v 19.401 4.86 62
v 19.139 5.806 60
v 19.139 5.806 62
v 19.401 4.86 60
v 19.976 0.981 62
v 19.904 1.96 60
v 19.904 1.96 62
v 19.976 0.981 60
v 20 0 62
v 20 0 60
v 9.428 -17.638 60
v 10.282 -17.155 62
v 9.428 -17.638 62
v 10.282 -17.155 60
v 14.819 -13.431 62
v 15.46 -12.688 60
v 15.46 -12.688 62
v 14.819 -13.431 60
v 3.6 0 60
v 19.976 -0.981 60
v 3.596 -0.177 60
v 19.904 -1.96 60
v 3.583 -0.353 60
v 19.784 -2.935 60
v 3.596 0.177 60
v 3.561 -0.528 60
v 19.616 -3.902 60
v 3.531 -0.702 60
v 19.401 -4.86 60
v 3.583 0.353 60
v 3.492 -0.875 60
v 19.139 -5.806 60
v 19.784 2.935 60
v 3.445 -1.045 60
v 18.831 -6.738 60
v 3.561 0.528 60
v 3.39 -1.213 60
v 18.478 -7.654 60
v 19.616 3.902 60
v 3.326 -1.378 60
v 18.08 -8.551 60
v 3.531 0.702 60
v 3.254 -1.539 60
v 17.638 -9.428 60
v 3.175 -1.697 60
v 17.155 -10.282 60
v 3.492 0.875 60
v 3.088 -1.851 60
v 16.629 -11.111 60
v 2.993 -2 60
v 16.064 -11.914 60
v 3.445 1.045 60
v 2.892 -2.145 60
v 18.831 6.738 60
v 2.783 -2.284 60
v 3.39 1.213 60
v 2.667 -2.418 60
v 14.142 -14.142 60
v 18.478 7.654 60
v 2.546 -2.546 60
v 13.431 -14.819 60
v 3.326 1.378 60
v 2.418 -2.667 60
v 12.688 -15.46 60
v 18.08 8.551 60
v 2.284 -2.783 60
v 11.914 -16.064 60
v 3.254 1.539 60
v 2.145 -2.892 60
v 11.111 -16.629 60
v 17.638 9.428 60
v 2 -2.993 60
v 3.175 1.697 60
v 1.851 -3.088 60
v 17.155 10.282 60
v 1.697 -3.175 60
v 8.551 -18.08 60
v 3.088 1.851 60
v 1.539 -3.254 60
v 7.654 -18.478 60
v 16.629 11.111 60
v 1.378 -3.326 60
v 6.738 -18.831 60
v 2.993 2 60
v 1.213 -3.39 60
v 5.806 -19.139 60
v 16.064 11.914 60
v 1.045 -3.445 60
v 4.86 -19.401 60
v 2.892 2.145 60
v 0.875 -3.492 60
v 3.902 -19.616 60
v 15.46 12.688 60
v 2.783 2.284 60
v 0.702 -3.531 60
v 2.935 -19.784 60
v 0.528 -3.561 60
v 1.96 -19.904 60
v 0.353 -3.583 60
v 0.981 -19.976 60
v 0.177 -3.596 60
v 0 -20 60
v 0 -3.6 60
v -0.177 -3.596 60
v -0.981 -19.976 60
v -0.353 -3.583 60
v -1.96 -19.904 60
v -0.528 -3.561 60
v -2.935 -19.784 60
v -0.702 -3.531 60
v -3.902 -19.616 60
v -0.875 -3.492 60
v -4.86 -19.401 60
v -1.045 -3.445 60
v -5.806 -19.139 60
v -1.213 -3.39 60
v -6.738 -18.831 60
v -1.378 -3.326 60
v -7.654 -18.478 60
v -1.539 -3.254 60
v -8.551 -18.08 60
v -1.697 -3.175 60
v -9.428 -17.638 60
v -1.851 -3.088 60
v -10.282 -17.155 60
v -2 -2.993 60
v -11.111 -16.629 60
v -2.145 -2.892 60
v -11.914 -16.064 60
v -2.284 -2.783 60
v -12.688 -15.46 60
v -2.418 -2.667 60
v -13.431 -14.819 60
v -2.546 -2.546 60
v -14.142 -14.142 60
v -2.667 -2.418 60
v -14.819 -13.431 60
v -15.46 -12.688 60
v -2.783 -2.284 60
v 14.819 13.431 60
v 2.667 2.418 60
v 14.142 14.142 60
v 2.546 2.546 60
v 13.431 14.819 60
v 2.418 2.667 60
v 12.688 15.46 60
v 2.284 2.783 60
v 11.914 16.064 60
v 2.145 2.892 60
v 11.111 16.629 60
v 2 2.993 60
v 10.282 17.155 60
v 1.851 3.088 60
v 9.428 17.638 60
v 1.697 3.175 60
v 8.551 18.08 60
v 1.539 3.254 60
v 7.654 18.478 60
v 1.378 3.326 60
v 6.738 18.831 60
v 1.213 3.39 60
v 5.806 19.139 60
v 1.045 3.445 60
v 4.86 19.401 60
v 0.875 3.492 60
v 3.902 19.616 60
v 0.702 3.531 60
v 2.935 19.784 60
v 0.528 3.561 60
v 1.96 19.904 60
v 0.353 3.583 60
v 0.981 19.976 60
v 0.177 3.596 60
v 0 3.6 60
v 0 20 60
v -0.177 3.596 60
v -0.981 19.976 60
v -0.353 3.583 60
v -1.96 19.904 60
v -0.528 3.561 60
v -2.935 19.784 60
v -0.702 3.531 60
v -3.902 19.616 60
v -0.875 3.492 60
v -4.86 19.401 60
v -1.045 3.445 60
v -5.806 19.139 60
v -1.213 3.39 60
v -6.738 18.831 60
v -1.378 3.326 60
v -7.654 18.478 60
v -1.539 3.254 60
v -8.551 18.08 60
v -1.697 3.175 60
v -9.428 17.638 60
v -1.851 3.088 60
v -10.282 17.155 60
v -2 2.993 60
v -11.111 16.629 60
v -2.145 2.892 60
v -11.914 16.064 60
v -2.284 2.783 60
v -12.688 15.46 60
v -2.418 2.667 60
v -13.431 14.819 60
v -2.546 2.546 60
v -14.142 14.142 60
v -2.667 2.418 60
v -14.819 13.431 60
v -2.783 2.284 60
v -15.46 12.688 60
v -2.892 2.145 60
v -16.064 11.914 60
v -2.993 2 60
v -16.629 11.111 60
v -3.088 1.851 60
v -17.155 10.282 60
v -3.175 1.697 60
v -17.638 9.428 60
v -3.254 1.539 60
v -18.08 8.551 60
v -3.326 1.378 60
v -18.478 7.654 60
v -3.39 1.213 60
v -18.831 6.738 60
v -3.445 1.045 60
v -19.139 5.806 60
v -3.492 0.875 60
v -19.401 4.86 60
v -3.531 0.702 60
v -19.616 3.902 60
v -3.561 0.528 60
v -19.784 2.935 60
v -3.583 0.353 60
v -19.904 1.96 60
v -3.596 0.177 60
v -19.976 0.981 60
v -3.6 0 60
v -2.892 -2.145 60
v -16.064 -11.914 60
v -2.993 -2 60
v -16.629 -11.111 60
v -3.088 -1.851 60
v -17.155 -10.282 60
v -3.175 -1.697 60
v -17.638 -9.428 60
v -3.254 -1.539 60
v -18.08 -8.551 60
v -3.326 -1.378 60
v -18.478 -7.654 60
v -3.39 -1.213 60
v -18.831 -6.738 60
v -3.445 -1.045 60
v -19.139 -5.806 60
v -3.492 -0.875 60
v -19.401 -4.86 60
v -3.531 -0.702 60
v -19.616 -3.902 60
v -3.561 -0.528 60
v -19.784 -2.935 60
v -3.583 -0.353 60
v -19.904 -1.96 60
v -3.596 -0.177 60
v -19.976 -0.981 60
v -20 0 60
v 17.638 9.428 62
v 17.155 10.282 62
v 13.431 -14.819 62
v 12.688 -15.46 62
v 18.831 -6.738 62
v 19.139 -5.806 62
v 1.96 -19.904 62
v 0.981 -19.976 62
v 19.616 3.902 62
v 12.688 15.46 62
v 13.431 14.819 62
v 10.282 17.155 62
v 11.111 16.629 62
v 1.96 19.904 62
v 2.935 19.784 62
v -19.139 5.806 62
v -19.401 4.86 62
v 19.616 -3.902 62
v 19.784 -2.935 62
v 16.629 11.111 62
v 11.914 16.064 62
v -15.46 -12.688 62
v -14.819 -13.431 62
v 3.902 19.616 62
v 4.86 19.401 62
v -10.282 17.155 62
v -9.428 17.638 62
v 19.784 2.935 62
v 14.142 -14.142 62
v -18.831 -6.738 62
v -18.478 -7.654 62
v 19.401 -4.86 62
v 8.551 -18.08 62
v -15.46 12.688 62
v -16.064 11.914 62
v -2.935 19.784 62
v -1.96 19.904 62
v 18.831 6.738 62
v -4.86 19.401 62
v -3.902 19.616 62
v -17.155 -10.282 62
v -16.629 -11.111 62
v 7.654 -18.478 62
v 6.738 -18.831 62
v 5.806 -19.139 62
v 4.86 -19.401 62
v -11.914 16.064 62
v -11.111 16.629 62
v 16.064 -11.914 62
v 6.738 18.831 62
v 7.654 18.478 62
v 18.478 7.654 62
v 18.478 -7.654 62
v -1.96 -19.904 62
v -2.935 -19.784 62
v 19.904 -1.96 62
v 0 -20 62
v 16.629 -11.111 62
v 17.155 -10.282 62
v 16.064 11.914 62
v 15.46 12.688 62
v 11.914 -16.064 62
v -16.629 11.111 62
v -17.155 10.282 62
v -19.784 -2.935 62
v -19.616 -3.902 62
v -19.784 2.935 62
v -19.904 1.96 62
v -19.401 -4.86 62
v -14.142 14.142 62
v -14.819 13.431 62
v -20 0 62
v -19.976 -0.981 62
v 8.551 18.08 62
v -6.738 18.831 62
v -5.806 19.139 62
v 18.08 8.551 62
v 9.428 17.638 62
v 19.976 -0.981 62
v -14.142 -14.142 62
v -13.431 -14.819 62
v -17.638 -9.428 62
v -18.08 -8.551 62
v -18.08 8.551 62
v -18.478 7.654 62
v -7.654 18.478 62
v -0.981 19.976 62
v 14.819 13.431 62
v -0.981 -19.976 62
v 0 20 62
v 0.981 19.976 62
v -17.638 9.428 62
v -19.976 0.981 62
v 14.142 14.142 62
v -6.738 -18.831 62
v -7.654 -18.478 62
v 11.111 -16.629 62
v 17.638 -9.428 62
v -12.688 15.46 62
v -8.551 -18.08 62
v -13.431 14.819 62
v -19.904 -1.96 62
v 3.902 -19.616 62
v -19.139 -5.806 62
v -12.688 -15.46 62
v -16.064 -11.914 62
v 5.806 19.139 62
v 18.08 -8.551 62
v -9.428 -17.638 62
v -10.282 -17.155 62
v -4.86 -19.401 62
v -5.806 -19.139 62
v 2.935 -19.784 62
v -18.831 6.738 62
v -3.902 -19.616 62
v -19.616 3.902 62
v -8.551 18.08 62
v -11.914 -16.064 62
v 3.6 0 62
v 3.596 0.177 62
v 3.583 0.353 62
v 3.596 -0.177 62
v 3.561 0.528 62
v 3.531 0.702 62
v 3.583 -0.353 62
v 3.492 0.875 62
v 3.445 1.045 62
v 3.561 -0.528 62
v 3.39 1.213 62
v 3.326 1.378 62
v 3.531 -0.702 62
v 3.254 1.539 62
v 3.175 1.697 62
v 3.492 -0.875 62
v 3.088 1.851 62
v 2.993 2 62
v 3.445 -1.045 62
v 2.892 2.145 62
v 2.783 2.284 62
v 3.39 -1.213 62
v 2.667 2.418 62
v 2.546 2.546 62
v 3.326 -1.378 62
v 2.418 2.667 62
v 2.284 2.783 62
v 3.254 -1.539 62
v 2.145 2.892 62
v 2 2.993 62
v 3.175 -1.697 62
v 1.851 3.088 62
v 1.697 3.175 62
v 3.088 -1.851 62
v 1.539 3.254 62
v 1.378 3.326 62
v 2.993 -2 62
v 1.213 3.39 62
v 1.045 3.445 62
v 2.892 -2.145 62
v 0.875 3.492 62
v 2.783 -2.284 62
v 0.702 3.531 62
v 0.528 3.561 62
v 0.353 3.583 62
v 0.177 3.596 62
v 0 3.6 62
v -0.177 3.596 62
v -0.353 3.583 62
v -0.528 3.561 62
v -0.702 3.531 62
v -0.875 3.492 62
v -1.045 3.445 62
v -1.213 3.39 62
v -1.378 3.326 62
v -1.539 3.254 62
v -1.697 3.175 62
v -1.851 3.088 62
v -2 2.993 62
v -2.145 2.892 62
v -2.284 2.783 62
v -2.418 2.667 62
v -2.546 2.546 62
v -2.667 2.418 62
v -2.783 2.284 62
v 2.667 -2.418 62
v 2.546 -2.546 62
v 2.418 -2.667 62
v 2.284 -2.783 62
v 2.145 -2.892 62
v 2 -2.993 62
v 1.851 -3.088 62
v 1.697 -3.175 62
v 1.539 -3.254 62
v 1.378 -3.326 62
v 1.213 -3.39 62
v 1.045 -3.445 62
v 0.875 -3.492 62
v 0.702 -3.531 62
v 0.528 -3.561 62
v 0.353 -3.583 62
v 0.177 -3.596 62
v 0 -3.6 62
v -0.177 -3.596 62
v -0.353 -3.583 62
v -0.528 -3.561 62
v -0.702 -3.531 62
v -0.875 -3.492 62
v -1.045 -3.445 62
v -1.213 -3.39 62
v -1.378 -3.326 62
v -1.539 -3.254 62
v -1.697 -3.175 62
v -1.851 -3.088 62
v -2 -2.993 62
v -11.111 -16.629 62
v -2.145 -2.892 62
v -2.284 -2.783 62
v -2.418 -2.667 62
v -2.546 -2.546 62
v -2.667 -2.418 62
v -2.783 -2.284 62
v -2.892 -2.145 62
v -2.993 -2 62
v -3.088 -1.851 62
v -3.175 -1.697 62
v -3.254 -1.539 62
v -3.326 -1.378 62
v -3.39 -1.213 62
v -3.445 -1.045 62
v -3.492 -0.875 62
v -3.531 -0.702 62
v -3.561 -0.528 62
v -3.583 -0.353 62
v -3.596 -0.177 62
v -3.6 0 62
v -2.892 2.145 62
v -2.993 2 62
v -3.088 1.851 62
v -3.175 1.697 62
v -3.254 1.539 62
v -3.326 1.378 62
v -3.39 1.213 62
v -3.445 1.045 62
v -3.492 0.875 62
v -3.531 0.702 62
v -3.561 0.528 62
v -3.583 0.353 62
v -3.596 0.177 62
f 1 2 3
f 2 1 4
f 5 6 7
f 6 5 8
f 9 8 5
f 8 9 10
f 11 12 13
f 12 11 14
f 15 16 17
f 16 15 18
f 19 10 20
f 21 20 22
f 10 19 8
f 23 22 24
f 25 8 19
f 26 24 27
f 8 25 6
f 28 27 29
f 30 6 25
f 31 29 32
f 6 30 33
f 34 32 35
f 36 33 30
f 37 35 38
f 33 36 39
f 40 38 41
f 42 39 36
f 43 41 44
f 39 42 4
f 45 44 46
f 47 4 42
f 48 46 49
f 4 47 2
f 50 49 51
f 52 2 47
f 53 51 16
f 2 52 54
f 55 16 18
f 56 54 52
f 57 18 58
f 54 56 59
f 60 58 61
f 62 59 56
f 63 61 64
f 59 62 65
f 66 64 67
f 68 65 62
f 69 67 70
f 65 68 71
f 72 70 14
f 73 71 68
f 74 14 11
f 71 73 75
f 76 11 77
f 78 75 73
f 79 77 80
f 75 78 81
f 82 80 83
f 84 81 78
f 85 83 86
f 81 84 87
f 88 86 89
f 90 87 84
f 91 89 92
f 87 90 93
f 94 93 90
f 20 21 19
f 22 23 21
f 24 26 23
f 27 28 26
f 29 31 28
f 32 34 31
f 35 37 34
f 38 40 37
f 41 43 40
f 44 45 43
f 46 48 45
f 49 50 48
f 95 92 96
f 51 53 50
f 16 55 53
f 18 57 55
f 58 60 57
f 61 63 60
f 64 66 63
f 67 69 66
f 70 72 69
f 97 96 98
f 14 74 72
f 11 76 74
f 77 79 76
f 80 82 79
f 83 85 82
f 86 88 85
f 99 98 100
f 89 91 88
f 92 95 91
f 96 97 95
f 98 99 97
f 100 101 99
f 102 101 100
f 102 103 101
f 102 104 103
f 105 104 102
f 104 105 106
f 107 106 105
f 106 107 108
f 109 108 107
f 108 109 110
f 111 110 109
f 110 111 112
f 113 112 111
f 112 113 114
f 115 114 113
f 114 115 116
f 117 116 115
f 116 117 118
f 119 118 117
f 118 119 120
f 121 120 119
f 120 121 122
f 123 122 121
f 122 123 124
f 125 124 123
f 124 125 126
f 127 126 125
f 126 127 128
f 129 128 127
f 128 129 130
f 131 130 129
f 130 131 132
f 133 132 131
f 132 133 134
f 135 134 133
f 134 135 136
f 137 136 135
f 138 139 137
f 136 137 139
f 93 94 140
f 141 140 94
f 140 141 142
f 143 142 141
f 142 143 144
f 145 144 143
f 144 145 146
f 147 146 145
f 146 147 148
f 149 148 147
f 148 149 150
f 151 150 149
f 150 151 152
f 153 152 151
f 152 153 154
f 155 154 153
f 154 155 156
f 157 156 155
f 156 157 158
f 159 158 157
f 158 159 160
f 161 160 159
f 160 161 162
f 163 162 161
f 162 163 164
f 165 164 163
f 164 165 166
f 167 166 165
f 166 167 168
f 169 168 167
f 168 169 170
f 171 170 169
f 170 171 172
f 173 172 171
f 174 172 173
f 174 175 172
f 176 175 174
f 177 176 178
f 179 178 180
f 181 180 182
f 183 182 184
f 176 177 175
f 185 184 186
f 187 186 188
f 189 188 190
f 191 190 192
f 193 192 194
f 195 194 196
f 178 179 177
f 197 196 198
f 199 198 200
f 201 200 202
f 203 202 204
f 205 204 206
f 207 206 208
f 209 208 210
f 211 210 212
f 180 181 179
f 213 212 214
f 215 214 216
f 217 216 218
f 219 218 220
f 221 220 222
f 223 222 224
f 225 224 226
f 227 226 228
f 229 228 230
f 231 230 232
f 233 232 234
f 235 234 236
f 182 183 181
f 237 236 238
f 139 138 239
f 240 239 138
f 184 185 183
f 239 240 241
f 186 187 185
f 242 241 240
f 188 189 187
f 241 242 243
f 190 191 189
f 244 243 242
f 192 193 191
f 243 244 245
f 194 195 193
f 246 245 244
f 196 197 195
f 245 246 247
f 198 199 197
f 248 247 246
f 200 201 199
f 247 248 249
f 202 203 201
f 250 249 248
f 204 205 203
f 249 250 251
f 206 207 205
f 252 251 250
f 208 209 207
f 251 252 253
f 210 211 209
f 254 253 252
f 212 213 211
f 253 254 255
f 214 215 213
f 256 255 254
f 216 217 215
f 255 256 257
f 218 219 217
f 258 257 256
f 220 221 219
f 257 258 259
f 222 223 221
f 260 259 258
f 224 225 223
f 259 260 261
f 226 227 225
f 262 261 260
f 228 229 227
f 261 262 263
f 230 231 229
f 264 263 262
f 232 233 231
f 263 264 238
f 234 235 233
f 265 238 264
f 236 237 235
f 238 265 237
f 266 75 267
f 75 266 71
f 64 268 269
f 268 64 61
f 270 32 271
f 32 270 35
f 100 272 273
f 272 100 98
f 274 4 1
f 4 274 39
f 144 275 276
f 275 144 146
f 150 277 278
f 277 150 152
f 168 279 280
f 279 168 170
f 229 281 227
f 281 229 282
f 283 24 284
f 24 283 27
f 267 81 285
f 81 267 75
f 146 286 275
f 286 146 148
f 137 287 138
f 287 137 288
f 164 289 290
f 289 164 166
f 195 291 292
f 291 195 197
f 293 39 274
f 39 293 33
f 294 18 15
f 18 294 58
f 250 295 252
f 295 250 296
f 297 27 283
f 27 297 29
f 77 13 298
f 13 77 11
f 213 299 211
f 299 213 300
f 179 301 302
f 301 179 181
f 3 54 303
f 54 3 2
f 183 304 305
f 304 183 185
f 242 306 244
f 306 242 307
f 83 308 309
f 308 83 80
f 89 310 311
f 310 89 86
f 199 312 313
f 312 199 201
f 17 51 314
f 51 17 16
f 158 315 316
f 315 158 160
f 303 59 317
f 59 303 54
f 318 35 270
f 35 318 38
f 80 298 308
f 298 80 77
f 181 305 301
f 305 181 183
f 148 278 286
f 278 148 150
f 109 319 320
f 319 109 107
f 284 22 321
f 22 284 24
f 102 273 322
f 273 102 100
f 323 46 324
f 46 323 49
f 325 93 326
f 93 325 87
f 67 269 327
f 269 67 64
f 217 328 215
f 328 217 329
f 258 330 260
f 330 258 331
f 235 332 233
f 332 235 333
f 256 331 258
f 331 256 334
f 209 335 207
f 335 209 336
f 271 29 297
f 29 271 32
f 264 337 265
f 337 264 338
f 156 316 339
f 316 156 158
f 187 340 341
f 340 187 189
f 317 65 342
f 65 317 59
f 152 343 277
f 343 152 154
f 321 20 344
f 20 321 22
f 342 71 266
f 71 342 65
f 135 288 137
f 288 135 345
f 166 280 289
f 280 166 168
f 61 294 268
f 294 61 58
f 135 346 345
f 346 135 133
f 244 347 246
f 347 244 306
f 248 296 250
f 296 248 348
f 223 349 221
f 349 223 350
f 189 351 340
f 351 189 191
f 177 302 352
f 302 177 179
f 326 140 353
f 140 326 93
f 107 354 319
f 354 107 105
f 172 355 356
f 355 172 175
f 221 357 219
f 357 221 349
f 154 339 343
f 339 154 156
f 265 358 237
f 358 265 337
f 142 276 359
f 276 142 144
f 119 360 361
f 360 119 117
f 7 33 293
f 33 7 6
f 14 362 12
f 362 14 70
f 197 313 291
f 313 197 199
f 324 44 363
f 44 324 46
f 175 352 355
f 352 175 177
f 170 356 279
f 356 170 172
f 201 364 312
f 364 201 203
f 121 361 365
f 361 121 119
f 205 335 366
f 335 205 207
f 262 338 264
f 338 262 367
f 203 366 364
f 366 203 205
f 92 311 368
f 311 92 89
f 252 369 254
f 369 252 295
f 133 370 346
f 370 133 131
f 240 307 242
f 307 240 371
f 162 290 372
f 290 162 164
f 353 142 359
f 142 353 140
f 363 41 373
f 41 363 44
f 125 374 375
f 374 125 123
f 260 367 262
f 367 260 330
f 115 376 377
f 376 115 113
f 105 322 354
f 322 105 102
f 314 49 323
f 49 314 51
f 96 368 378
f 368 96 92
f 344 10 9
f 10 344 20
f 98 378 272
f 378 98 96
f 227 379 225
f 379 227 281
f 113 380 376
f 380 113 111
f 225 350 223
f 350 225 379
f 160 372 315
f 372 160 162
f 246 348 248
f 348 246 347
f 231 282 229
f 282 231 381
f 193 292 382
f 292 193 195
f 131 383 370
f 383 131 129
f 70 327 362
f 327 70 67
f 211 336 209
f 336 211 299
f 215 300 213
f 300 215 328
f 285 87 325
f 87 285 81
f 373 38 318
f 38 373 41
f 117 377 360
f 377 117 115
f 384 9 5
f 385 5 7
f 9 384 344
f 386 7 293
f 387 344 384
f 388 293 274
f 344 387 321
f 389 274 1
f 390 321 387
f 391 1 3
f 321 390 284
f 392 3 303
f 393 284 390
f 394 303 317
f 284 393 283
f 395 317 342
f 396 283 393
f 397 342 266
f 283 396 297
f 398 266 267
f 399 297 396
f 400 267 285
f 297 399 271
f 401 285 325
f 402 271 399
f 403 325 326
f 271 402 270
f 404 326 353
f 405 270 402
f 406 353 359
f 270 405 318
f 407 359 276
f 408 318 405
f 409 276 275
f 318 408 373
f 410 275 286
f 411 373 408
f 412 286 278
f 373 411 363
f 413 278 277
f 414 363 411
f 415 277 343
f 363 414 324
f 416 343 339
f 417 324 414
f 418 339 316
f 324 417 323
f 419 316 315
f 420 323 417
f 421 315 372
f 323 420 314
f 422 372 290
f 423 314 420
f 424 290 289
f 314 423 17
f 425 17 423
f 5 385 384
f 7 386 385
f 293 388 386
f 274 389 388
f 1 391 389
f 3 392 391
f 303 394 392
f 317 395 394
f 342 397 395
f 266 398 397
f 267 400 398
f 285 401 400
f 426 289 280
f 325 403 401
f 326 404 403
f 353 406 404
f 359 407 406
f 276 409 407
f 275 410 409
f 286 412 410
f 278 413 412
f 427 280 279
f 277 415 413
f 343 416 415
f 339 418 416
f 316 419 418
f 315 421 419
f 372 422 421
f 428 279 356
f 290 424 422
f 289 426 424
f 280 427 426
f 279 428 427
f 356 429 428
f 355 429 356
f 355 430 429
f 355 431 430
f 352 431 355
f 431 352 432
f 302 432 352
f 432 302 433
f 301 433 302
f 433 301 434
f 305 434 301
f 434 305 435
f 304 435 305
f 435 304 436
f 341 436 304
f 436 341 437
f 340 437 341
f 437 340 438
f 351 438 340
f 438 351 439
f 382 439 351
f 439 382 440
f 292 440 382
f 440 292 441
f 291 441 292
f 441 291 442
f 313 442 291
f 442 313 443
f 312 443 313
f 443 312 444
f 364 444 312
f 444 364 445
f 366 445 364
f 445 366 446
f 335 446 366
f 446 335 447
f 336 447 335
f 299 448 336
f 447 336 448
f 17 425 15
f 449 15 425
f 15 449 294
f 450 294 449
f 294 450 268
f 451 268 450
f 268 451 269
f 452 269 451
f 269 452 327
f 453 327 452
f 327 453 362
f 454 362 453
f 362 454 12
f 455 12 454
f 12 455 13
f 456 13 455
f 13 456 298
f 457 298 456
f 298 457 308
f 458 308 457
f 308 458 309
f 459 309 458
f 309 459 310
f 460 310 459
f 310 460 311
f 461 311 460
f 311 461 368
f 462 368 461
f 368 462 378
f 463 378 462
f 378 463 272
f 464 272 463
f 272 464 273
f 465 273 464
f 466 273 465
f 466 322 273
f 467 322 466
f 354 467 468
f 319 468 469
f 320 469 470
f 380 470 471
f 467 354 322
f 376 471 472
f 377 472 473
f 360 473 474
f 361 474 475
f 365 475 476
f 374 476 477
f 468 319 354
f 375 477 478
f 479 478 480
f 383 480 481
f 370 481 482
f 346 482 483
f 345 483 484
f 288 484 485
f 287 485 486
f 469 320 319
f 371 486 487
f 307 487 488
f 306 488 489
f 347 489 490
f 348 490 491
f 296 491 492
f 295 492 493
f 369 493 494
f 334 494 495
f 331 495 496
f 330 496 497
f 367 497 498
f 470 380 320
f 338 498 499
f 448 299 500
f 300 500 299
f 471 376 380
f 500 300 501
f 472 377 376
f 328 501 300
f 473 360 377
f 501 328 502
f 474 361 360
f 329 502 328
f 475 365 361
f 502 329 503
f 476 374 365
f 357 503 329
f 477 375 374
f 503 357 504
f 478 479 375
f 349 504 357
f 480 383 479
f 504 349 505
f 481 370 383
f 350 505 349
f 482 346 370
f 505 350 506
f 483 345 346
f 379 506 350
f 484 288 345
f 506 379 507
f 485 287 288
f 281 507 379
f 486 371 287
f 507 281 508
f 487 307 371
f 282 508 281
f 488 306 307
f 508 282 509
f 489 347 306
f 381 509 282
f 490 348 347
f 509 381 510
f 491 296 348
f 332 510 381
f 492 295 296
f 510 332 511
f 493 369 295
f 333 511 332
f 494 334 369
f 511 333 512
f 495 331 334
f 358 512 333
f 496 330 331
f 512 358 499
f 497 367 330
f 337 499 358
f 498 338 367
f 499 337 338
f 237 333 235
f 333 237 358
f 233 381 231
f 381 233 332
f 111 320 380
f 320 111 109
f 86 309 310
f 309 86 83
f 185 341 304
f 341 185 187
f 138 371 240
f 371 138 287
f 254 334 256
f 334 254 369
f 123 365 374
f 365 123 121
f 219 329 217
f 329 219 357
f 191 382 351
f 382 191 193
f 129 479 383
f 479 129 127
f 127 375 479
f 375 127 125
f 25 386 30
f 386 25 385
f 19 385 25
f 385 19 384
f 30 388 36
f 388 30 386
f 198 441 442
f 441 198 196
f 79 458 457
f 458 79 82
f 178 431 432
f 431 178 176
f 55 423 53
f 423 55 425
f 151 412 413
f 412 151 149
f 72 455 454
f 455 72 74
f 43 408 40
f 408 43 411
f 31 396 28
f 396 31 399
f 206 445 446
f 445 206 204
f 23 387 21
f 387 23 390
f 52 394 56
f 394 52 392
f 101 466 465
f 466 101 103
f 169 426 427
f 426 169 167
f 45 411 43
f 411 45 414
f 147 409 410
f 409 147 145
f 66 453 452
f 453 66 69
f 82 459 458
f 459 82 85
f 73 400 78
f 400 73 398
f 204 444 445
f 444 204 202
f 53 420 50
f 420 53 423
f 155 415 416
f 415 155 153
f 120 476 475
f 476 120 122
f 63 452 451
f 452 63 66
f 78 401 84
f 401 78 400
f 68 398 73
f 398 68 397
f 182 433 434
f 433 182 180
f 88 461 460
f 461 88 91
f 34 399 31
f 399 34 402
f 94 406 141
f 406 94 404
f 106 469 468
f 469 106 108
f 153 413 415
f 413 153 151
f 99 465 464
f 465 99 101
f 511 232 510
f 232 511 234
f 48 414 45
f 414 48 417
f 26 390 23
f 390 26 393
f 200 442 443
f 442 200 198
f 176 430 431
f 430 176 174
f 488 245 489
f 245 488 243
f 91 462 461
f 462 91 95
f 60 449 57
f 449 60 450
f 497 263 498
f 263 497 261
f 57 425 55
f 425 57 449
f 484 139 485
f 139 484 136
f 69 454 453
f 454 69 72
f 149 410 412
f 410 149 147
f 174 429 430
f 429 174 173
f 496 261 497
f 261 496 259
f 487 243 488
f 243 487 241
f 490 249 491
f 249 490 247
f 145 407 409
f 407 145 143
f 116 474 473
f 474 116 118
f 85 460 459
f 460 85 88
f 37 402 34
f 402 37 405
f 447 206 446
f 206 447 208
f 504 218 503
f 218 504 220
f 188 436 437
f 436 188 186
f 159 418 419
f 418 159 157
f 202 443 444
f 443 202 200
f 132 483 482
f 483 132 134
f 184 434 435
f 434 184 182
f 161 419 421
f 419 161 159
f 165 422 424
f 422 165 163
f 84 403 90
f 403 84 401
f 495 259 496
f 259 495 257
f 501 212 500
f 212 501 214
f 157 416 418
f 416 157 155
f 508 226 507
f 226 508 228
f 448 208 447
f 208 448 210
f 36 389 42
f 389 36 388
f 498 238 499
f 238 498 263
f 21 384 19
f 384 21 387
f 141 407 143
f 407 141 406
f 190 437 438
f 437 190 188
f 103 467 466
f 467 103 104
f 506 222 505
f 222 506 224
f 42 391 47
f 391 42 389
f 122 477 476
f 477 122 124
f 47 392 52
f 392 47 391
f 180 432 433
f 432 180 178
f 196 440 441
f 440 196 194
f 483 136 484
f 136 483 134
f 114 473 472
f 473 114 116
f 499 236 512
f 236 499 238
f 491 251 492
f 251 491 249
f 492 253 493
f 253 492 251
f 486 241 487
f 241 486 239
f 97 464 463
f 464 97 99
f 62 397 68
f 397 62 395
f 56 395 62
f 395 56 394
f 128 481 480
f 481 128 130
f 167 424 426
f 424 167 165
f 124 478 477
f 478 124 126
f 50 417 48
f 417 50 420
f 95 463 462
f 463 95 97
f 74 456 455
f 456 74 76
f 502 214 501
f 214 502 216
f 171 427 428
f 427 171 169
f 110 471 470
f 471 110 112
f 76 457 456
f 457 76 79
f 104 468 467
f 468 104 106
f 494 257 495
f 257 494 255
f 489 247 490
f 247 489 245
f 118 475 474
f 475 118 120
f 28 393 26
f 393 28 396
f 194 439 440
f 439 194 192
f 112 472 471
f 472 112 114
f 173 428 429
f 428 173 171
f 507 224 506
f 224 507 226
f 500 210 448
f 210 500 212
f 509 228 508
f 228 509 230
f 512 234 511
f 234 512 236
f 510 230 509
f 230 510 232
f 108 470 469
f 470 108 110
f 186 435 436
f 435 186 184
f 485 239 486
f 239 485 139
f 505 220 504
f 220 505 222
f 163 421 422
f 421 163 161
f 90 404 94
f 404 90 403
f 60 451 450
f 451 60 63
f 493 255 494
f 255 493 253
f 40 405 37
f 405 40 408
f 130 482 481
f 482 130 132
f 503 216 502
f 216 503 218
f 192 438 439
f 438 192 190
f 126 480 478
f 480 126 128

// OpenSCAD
// file: common_params.scad
cylinder_radius = 20.000000;
cylinder_height = 60.000000;
wall_thickness = 2.000000;

cap_thickness = 2.000000;

rod_radius = 2.000000;
rod_height = 50.000000;

ring_outer_radius = 8.000000;
ring_inner_radius = 4.000000;
ring_thickness = 3.000000;
ring_z = 40.000000;

$fn = 128;
// main file
include <common_params.scad>;

hole_radius = 3.600000;

translate([0, 0, cylinder_height])
difference() {
    cylinder(h = cap_thickness, r = cylinder_radius);
    translate([0, 0, -0.1])
        cylinder(h = cap_thickness + 0.2, r = hole_radius);
}
